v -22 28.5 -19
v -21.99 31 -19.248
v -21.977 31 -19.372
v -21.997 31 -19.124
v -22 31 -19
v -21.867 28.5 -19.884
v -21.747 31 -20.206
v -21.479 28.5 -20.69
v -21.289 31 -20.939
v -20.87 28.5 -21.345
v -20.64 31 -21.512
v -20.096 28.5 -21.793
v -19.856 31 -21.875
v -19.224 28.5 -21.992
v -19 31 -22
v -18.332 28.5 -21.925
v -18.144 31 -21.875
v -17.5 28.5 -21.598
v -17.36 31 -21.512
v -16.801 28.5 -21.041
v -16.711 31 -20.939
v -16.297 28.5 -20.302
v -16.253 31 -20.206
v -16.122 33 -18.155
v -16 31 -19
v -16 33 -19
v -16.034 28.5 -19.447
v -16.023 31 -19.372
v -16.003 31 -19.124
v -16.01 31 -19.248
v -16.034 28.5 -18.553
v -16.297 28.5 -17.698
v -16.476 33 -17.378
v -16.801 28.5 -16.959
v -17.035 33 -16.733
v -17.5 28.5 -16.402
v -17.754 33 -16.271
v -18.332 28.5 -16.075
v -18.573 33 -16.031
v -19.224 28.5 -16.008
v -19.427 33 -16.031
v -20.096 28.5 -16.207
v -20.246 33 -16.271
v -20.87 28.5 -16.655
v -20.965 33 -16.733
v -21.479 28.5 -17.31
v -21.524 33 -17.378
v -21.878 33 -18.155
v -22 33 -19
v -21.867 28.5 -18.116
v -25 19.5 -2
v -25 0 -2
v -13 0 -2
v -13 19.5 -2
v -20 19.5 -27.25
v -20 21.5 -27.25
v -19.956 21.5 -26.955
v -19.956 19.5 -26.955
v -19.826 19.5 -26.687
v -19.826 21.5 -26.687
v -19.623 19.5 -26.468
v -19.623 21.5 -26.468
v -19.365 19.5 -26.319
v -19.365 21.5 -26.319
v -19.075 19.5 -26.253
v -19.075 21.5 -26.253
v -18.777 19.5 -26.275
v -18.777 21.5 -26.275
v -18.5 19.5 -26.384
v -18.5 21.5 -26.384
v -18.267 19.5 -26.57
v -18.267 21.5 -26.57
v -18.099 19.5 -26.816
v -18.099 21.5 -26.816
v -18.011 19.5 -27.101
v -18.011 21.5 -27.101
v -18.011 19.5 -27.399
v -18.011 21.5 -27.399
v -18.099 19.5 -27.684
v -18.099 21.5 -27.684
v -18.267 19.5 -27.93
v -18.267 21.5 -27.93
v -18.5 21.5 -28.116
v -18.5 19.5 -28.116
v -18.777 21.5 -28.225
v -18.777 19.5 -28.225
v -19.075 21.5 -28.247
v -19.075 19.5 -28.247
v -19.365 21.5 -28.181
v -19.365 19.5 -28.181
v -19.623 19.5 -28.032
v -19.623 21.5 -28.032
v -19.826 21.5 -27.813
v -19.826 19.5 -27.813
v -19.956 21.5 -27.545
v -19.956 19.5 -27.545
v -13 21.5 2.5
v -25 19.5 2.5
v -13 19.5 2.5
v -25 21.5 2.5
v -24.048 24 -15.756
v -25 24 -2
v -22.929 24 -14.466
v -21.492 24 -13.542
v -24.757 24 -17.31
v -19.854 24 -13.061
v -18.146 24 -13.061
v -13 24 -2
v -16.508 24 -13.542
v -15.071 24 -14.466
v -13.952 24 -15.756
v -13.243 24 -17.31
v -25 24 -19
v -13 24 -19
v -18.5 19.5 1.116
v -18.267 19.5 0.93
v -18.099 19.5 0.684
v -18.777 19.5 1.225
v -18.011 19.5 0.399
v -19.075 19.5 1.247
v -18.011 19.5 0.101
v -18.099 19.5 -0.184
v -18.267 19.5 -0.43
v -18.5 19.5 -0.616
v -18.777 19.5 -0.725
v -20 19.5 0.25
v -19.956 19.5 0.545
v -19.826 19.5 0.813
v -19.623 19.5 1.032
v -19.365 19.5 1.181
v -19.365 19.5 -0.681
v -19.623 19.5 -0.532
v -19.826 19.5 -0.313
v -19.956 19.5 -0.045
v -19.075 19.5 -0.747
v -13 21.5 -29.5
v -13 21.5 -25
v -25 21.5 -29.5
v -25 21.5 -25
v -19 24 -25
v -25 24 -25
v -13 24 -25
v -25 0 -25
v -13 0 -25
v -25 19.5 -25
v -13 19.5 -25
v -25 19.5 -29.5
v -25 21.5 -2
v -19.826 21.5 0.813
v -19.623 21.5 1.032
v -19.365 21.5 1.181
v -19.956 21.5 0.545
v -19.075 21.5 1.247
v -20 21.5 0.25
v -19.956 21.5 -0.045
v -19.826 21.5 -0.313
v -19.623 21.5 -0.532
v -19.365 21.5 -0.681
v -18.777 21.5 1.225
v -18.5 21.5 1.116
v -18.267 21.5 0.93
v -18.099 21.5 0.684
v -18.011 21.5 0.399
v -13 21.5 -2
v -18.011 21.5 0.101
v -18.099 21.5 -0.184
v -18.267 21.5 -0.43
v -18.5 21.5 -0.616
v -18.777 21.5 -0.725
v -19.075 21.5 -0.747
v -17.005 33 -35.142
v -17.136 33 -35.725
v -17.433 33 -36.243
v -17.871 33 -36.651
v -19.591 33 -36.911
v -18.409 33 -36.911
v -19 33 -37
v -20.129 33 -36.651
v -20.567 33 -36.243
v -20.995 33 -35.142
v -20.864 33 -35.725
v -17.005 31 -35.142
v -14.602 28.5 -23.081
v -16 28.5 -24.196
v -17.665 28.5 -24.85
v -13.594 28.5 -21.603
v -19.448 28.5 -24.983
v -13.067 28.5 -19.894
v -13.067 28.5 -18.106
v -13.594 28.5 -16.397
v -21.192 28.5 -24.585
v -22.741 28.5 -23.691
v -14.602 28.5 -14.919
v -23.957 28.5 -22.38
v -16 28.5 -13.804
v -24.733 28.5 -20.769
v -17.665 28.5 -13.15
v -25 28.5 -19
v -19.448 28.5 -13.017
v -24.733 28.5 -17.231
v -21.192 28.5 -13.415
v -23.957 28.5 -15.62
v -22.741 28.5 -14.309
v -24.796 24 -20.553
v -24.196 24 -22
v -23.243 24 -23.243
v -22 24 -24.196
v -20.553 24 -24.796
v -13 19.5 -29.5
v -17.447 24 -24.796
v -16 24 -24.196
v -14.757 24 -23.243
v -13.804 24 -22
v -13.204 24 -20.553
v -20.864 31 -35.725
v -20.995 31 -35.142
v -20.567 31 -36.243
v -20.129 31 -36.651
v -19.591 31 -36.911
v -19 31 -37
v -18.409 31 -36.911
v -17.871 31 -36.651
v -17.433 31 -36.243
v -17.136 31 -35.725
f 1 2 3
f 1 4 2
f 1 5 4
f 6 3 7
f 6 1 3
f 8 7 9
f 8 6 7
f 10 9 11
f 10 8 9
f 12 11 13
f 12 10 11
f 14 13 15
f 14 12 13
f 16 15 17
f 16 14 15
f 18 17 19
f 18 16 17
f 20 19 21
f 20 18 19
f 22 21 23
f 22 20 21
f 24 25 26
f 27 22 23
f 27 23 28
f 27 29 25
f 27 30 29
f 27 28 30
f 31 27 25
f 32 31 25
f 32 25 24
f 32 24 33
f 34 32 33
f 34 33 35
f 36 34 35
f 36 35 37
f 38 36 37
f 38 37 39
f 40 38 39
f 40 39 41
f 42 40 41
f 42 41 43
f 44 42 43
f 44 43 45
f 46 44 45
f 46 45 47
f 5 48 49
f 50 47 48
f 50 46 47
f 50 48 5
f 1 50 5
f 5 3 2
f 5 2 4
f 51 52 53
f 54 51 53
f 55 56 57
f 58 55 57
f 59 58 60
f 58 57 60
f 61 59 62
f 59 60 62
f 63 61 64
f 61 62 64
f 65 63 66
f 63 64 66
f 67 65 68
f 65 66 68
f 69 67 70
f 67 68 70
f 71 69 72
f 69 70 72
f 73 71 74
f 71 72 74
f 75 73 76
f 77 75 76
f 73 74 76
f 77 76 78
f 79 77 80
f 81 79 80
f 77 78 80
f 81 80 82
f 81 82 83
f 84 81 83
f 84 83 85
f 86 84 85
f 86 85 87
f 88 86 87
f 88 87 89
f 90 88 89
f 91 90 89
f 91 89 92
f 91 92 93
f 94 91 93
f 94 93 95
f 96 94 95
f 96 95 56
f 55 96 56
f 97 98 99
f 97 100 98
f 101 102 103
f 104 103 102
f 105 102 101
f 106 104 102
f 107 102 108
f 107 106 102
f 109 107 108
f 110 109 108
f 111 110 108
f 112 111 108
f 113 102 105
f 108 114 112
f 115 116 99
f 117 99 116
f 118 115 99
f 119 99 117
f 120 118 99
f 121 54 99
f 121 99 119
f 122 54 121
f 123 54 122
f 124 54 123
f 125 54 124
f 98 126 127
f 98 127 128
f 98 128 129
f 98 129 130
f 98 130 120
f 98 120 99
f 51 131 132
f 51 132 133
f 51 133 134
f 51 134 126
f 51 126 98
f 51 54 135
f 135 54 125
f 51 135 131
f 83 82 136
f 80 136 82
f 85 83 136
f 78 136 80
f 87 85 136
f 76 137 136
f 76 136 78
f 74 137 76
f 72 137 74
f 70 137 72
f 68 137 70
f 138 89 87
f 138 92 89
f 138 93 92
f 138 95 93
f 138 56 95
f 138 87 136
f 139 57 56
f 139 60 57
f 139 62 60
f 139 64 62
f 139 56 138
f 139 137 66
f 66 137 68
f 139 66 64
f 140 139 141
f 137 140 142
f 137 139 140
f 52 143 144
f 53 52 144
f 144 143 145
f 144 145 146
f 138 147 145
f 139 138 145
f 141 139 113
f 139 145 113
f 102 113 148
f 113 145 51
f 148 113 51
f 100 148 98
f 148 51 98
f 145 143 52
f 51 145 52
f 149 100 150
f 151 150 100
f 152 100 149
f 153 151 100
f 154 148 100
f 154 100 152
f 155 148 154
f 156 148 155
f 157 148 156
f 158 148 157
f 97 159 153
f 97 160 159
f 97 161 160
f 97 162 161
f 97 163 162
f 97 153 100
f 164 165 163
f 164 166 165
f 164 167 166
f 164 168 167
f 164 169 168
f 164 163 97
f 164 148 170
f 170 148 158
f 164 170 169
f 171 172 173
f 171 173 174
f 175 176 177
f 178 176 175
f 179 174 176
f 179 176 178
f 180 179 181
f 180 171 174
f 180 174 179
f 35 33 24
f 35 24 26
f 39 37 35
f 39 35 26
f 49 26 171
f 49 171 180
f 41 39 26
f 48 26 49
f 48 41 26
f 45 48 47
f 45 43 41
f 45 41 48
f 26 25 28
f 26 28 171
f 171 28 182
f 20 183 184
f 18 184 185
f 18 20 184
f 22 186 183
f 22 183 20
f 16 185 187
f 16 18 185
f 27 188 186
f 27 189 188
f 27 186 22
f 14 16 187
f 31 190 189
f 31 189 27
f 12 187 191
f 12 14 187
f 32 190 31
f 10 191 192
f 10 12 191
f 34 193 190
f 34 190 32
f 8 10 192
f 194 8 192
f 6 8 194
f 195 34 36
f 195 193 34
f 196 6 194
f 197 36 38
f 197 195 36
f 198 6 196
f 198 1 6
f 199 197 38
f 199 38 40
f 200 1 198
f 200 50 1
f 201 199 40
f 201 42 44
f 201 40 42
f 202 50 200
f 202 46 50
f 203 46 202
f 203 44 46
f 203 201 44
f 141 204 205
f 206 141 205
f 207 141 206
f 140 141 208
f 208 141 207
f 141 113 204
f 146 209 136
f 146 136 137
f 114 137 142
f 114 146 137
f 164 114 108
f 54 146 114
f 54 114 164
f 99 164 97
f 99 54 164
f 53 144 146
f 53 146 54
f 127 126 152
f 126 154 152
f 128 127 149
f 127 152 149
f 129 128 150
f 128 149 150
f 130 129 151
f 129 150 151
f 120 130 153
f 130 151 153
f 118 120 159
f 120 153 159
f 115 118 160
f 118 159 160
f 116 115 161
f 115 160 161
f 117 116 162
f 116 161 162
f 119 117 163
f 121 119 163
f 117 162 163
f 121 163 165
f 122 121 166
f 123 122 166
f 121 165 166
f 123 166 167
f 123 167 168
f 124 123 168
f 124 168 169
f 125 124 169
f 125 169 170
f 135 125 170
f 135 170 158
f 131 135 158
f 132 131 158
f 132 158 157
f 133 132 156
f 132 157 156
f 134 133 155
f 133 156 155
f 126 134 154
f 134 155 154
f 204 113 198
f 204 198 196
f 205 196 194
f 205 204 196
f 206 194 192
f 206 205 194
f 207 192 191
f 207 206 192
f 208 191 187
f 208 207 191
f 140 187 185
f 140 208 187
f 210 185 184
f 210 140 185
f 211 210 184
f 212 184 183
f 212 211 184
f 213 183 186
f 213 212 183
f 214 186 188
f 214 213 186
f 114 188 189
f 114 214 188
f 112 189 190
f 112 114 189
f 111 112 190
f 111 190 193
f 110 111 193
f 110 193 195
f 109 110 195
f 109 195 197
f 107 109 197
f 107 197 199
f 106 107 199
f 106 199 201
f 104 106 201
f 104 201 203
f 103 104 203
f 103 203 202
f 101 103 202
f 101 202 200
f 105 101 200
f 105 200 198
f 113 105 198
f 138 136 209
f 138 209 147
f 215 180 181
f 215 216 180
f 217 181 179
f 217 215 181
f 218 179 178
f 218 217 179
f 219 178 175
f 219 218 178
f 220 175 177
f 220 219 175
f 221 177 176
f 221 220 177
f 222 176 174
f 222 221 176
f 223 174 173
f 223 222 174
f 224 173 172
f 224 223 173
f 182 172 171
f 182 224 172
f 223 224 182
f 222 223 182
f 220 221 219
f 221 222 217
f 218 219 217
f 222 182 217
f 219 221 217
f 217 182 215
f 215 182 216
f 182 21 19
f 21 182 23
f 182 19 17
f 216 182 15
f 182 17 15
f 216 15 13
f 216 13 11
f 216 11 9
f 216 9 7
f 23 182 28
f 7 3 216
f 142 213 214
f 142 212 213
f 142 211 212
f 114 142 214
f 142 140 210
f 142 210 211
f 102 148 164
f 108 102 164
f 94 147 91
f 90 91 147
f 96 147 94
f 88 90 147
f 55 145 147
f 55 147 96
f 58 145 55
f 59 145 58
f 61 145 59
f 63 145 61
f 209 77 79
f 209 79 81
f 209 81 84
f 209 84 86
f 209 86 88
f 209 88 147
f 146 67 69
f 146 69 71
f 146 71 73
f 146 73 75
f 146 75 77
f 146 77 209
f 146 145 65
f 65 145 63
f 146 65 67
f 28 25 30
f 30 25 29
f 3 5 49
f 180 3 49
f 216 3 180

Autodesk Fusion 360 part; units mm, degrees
sketch "Boceto1" plane through (0, 0, 0) normal (0, 1, 0) x (1, 0, 0)
  line L0 (-25, 25) -> (-25, 2)
  line L1 (-25, 25) -> (-13, 25)
  line L2 (-13, 25) -> (-13, 2)
  line L3 (-25, 2) -> (-13, 2)
  dimension "d1" = 23
  dimension "d2" = 12
extrude "Extruir1" add sketch "Boceto1" along normal blind 24
sketch "Boceto2" plane through (0, 0, -2) normal (0, 0, 1) x (1, 0, 0)
  line L0 (-25, 0) -> (-13, 0)
  line L1 (-13, 0) -> (-13, 24)
  line L2 (-13, 24) -> (-25, 24)
  line L3 (-25, 24) -> (-25, 0)
  line L4 (-13, 19.5) -> (-25, 19.5)
  line L5 (-25, 19.5) -> (-25, 21.5)
  line L6 (-25, 21.5) -> (-13, 21.5)
  line L7 (-13, 21.5) -> (-13, 19.5)
  dimension "d5" = 19.5
  dimension "d6" = 2
extrude "Extruir2" add sketch "Boceto2" along normal blind 4.5 contours L1 L3 L4 L5 L6 L7
sketch "Boceto3" plane through (0, 0, -25) normal (0, 0, -1) x (-1, 0, 0)
  line L0 (13, 0) -> (25, 0)
  line L1 (25, 0) -> (25, 24)
  line L2 (25, 24) -> (13, 24)
  line L3 (13, 24) -> (13, 0)
  line L4 (25, 19.5) -> (13, 19.5)
  line L5 (13, 19.5) -> (13, 21.5)
  line L6 (13, 21.5) -> (25, 21.5)
  line L7 (25, 21.5) -> (25, 19.5)
  dimension "d9" = 19.5
  dimension "d10" = 2
extrude "Extruir3" add sketch "Boceto3" along normal blind 4.5 contours L1 L3 L4 L5 L6 L7
sketch "Boceto4" plane through (0, 21.5, 0) normal (0, 1, 0) x (-1, 0, 0)
  line L0 (13, -2) -> (25, -2)
  line L1 (25, -2) -> (25, 2.5)
  line L2 (25, 2.5) -> (13, 2.5)
  line L3 (13, 2.5) -> (13, -2)
  circle A0 centre (19, 0.25) radius 1
  dimension "d13" = 2
sketch "Boceto5" plane through (0, 21.5, 0) normal (0, 1, 0) x (-1, 0, 0)
  line L0 (25, -25) -> (13, -25)
  line L1 (13, -25) -> (13, -29.5)
  line L2 (13, -29.5) -> (25, -29.5)
  line L3 (25, -29.5) -> (25, -25)
  circle A0 centre (19, -27.25) radius 1
  dimension "d14" = 2
extrude "Extruir4" cut sketch "Boceto4" sketch "Boceto5" against normal blind 5 contours A0 of sketch 2 contours A0
sketch "Boceto6" plane through (0, 24, 0) normal (0, 1, 0) x (-1, 0, 0)
  line L0 (25, -25) -> (25, -2)
  line L1 (25, -2) -> (13, -2)
  line L2 (13, -2) -> (13, -25)
  line L3 (13, -25) -> (25, -25)
  line L4 (13, -25) -> (13, -19)
  circle A0 centre (19, -19) radius 6
extrude "Extruir5" add sketch "Boceto6" along normal blind 4.5 contours A0
sketch "Boceto7" plane through (0, 28.5, 0) normal (0, 1, 0) x (-1, 0, 0)
  circle A0 centre (19, -19) radius 6
  circle A1 centre (19, -19) radius 3
  dimension "d19" = 6
extrude "Extruir6" add sketch "Boceto7" along normal blind 2.5 contours A1
sketch "Boceto8" plane through (0, 31, 0) normal (0, 1, 0) x (-1, 0, 0)
  line L0 (22, -19) -> (20.995, -35.1418)
  line L1 (16, -19) -> (17.005, -35.1418)
  arc A0 (22, -19) -> (16, -19) centre (19, -19) ccw
  arc A1 (17.005, -35.1418) -> (20.995, -35.1418) centre (19, -35) ccw
extrude "Extruir7" add sketch "Boceto8" along normal blind 2
